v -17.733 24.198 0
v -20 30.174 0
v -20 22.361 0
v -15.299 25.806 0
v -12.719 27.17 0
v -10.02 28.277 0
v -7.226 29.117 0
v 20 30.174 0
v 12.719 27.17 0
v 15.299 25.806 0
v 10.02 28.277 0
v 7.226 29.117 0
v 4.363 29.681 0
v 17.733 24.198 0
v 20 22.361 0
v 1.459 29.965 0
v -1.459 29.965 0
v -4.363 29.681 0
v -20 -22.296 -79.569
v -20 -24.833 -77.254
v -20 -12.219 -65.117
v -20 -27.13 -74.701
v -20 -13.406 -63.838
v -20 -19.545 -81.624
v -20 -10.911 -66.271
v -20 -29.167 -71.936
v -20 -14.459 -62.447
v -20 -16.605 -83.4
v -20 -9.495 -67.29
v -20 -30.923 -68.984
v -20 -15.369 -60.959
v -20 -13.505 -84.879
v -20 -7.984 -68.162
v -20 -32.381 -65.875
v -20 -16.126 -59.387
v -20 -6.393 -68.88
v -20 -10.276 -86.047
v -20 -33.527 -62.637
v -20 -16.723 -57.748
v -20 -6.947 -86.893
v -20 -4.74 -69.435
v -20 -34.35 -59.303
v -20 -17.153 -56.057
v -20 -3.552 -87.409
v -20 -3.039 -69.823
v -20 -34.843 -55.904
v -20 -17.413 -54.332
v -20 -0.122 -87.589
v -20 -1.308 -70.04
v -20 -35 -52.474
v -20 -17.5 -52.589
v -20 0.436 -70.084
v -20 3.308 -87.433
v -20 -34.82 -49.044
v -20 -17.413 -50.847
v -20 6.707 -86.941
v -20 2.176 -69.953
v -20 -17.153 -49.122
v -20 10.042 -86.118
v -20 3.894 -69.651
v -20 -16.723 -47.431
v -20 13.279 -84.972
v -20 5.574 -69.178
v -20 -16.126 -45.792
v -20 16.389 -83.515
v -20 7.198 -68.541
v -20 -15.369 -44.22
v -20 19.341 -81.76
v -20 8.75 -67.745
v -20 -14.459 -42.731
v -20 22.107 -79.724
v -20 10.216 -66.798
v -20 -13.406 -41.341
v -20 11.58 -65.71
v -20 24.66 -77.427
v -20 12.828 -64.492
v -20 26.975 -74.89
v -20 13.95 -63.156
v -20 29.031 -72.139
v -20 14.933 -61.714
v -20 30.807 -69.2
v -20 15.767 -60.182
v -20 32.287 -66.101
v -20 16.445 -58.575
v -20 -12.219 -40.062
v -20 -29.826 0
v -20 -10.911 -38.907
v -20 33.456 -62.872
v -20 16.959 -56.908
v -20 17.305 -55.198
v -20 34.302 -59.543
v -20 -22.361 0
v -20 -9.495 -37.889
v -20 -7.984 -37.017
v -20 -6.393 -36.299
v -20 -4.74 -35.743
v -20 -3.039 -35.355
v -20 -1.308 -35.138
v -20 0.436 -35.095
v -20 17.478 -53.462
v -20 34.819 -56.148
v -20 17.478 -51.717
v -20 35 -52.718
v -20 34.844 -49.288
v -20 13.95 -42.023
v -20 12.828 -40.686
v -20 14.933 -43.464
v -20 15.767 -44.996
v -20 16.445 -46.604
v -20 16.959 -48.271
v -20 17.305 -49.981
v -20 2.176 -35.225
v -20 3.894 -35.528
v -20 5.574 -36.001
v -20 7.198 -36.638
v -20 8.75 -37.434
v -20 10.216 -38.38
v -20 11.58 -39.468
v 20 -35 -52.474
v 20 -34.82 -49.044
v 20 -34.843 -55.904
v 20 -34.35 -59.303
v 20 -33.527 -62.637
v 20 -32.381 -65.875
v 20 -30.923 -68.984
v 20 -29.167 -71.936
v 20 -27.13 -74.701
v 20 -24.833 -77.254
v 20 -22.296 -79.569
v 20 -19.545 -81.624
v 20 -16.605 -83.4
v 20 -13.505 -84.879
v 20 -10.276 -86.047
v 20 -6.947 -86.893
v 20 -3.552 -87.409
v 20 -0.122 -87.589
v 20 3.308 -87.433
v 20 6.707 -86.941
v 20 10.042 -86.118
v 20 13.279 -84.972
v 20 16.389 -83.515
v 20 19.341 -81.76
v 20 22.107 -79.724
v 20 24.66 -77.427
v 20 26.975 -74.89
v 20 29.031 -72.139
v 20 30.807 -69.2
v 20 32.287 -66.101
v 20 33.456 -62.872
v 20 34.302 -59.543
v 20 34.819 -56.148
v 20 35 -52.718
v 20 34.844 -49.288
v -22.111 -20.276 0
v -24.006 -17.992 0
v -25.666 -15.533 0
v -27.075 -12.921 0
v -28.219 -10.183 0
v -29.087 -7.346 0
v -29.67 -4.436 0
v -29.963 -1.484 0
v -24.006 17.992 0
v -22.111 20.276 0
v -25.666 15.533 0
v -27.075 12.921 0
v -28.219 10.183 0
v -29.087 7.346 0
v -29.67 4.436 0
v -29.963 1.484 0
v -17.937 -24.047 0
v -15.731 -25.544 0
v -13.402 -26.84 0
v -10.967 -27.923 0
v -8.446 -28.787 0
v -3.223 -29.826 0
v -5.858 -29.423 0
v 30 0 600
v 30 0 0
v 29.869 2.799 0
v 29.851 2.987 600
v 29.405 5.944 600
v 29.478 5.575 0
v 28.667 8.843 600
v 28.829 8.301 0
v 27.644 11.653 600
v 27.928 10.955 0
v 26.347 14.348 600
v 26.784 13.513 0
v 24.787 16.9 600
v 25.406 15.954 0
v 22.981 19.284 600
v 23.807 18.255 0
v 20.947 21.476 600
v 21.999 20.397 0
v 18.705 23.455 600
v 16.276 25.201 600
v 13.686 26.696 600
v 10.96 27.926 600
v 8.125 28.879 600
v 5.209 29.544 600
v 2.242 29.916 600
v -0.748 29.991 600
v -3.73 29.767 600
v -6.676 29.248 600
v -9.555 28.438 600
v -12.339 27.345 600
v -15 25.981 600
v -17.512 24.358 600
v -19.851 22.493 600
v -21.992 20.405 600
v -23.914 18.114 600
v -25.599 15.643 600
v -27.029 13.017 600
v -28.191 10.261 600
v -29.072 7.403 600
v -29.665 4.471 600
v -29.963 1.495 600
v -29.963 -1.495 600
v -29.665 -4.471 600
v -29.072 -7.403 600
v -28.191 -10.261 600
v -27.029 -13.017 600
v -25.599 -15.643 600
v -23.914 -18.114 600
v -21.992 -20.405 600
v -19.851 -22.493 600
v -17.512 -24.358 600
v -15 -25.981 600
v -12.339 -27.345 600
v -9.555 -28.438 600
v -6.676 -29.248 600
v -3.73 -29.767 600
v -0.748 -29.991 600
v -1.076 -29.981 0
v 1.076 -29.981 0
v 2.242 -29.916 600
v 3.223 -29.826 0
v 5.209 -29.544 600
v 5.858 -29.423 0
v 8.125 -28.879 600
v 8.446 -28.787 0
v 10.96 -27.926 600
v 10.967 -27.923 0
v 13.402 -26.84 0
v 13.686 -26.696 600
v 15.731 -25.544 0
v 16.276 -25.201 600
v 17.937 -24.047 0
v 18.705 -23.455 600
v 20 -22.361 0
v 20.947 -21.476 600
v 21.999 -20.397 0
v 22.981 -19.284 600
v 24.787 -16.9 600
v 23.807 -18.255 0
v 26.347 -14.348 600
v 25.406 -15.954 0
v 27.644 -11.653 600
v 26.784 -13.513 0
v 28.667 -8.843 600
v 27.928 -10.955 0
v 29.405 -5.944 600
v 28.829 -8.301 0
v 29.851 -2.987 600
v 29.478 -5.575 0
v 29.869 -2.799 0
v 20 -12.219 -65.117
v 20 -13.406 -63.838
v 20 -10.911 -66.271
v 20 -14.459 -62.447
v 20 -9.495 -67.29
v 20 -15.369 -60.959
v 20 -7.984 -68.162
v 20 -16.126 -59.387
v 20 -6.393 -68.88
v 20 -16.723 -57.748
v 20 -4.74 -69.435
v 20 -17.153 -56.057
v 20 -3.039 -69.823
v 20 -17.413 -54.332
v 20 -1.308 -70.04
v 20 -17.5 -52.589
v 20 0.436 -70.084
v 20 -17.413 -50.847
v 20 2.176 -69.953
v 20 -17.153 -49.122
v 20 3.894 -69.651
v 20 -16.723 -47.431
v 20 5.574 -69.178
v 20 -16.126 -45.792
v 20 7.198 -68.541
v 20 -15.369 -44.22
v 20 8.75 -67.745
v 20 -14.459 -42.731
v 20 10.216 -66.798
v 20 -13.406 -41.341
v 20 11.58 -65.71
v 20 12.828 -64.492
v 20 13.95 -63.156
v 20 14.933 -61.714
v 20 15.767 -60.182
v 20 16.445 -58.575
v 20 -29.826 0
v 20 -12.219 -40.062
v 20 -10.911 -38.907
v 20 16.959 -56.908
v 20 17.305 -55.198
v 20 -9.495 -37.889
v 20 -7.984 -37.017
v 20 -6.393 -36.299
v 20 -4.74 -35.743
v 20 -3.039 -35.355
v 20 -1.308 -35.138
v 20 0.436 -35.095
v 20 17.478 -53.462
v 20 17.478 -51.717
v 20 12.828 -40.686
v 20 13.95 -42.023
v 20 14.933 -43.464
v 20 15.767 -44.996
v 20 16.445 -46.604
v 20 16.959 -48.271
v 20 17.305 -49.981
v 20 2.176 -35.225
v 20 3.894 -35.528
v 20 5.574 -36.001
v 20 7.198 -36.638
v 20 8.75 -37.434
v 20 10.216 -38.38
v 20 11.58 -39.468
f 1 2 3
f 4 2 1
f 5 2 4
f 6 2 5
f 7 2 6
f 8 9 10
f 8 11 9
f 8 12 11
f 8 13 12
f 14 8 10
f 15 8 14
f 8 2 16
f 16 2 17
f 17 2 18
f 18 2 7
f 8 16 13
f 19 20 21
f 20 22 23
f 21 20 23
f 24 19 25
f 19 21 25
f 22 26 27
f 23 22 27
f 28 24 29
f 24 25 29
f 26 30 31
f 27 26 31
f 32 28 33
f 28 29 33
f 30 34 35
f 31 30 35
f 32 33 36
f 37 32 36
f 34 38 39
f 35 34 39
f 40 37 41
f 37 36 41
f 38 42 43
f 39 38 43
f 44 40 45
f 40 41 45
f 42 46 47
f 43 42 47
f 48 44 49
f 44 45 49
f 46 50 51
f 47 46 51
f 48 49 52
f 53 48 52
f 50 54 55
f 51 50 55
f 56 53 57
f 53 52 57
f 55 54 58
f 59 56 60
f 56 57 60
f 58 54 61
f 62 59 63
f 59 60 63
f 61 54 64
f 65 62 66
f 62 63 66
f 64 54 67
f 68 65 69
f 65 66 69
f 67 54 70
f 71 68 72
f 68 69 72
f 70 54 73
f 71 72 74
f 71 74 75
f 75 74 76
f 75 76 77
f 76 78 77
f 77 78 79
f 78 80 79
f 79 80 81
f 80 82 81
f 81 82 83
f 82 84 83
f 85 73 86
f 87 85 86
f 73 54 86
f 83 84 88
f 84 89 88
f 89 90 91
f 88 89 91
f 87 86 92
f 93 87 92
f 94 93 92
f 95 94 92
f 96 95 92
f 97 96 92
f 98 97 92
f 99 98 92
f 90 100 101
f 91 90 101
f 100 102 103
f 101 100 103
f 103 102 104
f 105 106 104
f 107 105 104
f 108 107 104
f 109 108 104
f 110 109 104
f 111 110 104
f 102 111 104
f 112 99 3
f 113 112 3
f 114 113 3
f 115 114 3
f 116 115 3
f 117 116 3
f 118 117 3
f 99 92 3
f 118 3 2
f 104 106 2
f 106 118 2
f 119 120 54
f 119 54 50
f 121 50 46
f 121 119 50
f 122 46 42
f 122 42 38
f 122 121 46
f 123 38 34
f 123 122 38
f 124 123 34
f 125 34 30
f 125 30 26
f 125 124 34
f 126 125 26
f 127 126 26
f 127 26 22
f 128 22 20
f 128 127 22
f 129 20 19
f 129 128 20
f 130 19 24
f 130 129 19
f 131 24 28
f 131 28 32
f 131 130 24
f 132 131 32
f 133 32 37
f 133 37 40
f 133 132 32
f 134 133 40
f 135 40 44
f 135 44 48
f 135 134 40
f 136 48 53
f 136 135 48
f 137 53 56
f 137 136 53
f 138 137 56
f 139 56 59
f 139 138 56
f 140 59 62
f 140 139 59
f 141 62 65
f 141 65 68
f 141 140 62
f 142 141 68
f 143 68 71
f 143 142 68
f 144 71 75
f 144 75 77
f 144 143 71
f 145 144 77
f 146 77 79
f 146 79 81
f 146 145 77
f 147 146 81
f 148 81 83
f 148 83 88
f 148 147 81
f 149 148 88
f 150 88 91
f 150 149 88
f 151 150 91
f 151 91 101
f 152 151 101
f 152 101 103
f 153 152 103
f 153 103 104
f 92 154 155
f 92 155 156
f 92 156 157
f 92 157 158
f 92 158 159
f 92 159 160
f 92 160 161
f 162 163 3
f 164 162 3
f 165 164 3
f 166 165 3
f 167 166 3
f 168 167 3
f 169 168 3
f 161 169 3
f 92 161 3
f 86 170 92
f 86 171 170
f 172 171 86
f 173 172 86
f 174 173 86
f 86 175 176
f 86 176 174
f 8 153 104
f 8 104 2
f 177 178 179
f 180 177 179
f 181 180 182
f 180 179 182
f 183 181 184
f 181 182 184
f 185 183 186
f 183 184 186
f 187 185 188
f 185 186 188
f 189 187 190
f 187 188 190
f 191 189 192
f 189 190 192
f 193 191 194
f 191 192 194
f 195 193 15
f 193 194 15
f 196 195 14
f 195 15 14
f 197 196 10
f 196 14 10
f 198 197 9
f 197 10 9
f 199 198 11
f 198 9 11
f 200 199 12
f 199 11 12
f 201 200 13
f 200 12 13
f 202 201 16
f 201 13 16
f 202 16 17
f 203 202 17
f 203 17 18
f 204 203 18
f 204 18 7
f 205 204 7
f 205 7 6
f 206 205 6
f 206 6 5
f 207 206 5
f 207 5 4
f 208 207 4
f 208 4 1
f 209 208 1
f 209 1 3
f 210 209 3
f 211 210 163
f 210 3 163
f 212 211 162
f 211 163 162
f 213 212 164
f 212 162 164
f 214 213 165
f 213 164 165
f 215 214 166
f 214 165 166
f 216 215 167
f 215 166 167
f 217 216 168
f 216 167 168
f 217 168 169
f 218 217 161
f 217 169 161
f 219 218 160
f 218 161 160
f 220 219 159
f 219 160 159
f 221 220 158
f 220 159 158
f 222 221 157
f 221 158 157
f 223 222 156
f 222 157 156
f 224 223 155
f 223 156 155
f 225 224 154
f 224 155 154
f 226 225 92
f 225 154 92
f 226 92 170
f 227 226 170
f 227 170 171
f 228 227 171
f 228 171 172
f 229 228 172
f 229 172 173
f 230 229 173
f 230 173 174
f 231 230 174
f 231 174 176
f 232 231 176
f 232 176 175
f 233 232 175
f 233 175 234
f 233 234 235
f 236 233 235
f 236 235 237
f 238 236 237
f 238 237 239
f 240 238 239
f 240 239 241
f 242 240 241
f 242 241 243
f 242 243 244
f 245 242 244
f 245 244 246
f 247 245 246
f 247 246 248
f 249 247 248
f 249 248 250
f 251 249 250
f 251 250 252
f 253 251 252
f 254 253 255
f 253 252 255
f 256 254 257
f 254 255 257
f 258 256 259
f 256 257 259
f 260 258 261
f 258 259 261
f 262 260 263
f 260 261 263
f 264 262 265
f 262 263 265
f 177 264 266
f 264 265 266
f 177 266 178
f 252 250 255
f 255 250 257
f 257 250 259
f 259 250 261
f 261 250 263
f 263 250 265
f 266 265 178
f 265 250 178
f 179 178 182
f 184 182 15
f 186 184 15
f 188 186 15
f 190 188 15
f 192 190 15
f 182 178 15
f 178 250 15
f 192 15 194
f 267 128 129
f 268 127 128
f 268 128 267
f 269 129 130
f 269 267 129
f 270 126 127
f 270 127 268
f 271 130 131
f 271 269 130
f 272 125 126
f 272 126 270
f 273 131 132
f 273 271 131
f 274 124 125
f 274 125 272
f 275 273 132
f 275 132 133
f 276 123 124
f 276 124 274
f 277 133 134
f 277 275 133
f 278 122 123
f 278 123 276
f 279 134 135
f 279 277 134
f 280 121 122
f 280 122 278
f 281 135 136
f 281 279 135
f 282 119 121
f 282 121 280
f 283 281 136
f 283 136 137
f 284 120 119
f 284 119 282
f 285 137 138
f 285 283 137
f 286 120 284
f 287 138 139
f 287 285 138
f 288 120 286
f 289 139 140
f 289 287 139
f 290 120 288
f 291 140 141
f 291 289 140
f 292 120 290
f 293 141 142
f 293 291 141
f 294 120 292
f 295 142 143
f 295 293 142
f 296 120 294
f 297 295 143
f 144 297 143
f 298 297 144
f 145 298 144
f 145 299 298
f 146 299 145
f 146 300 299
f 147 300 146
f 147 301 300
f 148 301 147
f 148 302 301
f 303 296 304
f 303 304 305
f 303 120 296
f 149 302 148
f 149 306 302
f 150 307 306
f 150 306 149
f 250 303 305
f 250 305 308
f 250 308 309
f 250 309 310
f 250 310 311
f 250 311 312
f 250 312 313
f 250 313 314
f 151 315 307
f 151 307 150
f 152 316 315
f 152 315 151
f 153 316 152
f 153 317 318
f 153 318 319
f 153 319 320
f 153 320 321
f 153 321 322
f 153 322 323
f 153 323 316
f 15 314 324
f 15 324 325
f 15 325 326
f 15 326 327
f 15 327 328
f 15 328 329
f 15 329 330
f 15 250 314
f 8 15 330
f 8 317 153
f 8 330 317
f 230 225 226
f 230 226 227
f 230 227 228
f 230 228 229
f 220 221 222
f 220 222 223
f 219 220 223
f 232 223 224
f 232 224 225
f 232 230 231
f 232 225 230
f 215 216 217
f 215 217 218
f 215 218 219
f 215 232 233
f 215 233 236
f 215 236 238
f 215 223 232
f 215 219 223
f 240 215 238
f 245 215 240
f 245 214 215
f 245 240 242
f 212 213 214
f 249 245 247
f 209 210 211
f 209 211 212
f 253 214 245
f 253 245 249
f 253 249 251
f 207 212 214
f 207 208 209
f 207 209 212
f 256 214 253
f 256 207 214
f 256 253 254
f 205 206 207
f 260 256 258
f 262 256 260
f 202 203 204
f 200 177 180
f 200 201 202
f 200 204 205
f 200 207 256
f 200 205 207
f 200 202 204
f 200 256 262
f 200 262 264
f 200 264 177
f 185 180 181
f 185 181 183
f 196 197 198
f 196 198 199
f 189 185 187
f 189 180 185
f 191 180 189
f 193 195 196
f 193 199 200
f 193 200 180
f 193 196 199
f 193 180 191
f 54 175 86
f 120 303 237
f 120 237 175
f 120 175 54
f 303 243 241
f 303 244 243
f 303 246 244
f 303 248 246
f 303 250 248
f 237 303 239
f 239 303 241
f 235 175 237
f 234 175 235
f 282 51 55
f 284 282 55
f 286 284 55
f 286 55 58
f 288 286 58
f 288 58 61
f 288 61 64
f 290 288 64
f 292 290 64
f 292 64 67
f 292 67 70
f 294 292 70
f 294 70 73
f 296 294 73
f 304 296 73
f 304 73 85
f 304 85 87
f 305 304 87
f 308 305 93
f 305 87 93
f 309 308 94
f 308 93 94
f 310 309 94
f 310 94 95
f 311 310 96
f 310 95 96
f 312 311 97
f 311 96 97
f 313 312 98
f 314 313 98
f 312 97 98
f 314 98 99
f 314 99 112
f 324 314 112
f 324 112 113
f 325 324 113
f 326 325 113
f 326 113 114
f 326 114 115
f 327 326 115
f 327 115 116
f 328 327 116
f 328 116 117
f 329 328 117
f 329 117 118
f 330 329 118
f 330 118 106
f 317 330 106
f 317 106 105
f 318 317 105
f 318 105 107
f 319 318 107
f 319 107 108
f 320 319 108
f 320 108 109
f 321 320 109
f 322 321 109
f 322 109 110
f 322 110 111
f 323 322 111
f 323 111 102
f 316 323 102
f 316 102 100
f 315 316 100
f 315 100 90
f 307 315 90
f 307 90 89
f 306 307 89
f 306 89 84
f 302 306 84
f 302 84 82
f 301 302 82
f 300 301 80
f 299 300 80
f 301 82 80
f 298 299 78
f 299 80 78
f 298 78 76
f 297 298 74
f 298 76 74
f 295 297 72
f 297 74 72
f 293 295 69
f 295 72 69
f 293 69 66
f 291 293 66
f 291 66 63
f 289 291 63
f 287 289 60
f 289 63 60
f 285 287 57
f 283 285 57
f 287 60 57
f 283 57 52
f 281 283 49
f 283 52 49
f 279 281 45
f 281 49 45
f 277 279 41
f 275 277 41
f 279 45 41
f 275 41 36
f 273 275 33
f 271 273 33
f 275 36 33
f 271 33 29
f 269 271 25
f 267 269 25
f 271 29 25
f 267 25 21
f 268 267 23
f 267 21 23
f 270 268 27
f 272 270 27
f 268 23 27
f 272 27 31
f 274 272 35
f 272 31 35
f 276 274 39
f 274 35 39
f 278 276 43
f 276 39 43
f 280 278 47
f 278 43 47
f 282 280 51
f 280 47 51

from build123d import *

# Parameters (mm, degrees)
F0_R     = 30
F1_DEPTH = 600
F3_DEPTH = 20
F4_R     = 17.5
F5_DEPTH = 50


with BuildPart() as f1:
    # F0 (on Top) → F1 (new body)
    with BuildSketch(Plane.XY):
        Circle(F0_R)
    extrude(amount=F1_DEPTH)

    # F2 (on Right) → F3 (join, symmetric)
    with BuildSketch(Plane.YZ):
        with BuildLine():
            Line((-29.826352, 0), (-34.819973, -49.043968))
            ThreePointArc((-34.819973, -49.043968), (-0.122433, -87.589098), (34.843925, -49.287659))
            Line((34.843925, -49.287659), (30.173648, 0))
            Line((30.173648, 0), (-29.826352, 0))
        make_face()
    extrude(amount=F3_DEPTH, both=True)

    # F4 (on face) → F5 (cut)
    with BuildSketch(Plane(origin=(-20, 0, 0), x_dir=(0, -1, 0), z_dir=(-1, 0, 0))):
        with Locations((0, -52.589312)):
            Circle(F4_R)
    extrude(amount=-F5_DEPTH, mode=Mode.SUBTRACT)


solid = f1.part
